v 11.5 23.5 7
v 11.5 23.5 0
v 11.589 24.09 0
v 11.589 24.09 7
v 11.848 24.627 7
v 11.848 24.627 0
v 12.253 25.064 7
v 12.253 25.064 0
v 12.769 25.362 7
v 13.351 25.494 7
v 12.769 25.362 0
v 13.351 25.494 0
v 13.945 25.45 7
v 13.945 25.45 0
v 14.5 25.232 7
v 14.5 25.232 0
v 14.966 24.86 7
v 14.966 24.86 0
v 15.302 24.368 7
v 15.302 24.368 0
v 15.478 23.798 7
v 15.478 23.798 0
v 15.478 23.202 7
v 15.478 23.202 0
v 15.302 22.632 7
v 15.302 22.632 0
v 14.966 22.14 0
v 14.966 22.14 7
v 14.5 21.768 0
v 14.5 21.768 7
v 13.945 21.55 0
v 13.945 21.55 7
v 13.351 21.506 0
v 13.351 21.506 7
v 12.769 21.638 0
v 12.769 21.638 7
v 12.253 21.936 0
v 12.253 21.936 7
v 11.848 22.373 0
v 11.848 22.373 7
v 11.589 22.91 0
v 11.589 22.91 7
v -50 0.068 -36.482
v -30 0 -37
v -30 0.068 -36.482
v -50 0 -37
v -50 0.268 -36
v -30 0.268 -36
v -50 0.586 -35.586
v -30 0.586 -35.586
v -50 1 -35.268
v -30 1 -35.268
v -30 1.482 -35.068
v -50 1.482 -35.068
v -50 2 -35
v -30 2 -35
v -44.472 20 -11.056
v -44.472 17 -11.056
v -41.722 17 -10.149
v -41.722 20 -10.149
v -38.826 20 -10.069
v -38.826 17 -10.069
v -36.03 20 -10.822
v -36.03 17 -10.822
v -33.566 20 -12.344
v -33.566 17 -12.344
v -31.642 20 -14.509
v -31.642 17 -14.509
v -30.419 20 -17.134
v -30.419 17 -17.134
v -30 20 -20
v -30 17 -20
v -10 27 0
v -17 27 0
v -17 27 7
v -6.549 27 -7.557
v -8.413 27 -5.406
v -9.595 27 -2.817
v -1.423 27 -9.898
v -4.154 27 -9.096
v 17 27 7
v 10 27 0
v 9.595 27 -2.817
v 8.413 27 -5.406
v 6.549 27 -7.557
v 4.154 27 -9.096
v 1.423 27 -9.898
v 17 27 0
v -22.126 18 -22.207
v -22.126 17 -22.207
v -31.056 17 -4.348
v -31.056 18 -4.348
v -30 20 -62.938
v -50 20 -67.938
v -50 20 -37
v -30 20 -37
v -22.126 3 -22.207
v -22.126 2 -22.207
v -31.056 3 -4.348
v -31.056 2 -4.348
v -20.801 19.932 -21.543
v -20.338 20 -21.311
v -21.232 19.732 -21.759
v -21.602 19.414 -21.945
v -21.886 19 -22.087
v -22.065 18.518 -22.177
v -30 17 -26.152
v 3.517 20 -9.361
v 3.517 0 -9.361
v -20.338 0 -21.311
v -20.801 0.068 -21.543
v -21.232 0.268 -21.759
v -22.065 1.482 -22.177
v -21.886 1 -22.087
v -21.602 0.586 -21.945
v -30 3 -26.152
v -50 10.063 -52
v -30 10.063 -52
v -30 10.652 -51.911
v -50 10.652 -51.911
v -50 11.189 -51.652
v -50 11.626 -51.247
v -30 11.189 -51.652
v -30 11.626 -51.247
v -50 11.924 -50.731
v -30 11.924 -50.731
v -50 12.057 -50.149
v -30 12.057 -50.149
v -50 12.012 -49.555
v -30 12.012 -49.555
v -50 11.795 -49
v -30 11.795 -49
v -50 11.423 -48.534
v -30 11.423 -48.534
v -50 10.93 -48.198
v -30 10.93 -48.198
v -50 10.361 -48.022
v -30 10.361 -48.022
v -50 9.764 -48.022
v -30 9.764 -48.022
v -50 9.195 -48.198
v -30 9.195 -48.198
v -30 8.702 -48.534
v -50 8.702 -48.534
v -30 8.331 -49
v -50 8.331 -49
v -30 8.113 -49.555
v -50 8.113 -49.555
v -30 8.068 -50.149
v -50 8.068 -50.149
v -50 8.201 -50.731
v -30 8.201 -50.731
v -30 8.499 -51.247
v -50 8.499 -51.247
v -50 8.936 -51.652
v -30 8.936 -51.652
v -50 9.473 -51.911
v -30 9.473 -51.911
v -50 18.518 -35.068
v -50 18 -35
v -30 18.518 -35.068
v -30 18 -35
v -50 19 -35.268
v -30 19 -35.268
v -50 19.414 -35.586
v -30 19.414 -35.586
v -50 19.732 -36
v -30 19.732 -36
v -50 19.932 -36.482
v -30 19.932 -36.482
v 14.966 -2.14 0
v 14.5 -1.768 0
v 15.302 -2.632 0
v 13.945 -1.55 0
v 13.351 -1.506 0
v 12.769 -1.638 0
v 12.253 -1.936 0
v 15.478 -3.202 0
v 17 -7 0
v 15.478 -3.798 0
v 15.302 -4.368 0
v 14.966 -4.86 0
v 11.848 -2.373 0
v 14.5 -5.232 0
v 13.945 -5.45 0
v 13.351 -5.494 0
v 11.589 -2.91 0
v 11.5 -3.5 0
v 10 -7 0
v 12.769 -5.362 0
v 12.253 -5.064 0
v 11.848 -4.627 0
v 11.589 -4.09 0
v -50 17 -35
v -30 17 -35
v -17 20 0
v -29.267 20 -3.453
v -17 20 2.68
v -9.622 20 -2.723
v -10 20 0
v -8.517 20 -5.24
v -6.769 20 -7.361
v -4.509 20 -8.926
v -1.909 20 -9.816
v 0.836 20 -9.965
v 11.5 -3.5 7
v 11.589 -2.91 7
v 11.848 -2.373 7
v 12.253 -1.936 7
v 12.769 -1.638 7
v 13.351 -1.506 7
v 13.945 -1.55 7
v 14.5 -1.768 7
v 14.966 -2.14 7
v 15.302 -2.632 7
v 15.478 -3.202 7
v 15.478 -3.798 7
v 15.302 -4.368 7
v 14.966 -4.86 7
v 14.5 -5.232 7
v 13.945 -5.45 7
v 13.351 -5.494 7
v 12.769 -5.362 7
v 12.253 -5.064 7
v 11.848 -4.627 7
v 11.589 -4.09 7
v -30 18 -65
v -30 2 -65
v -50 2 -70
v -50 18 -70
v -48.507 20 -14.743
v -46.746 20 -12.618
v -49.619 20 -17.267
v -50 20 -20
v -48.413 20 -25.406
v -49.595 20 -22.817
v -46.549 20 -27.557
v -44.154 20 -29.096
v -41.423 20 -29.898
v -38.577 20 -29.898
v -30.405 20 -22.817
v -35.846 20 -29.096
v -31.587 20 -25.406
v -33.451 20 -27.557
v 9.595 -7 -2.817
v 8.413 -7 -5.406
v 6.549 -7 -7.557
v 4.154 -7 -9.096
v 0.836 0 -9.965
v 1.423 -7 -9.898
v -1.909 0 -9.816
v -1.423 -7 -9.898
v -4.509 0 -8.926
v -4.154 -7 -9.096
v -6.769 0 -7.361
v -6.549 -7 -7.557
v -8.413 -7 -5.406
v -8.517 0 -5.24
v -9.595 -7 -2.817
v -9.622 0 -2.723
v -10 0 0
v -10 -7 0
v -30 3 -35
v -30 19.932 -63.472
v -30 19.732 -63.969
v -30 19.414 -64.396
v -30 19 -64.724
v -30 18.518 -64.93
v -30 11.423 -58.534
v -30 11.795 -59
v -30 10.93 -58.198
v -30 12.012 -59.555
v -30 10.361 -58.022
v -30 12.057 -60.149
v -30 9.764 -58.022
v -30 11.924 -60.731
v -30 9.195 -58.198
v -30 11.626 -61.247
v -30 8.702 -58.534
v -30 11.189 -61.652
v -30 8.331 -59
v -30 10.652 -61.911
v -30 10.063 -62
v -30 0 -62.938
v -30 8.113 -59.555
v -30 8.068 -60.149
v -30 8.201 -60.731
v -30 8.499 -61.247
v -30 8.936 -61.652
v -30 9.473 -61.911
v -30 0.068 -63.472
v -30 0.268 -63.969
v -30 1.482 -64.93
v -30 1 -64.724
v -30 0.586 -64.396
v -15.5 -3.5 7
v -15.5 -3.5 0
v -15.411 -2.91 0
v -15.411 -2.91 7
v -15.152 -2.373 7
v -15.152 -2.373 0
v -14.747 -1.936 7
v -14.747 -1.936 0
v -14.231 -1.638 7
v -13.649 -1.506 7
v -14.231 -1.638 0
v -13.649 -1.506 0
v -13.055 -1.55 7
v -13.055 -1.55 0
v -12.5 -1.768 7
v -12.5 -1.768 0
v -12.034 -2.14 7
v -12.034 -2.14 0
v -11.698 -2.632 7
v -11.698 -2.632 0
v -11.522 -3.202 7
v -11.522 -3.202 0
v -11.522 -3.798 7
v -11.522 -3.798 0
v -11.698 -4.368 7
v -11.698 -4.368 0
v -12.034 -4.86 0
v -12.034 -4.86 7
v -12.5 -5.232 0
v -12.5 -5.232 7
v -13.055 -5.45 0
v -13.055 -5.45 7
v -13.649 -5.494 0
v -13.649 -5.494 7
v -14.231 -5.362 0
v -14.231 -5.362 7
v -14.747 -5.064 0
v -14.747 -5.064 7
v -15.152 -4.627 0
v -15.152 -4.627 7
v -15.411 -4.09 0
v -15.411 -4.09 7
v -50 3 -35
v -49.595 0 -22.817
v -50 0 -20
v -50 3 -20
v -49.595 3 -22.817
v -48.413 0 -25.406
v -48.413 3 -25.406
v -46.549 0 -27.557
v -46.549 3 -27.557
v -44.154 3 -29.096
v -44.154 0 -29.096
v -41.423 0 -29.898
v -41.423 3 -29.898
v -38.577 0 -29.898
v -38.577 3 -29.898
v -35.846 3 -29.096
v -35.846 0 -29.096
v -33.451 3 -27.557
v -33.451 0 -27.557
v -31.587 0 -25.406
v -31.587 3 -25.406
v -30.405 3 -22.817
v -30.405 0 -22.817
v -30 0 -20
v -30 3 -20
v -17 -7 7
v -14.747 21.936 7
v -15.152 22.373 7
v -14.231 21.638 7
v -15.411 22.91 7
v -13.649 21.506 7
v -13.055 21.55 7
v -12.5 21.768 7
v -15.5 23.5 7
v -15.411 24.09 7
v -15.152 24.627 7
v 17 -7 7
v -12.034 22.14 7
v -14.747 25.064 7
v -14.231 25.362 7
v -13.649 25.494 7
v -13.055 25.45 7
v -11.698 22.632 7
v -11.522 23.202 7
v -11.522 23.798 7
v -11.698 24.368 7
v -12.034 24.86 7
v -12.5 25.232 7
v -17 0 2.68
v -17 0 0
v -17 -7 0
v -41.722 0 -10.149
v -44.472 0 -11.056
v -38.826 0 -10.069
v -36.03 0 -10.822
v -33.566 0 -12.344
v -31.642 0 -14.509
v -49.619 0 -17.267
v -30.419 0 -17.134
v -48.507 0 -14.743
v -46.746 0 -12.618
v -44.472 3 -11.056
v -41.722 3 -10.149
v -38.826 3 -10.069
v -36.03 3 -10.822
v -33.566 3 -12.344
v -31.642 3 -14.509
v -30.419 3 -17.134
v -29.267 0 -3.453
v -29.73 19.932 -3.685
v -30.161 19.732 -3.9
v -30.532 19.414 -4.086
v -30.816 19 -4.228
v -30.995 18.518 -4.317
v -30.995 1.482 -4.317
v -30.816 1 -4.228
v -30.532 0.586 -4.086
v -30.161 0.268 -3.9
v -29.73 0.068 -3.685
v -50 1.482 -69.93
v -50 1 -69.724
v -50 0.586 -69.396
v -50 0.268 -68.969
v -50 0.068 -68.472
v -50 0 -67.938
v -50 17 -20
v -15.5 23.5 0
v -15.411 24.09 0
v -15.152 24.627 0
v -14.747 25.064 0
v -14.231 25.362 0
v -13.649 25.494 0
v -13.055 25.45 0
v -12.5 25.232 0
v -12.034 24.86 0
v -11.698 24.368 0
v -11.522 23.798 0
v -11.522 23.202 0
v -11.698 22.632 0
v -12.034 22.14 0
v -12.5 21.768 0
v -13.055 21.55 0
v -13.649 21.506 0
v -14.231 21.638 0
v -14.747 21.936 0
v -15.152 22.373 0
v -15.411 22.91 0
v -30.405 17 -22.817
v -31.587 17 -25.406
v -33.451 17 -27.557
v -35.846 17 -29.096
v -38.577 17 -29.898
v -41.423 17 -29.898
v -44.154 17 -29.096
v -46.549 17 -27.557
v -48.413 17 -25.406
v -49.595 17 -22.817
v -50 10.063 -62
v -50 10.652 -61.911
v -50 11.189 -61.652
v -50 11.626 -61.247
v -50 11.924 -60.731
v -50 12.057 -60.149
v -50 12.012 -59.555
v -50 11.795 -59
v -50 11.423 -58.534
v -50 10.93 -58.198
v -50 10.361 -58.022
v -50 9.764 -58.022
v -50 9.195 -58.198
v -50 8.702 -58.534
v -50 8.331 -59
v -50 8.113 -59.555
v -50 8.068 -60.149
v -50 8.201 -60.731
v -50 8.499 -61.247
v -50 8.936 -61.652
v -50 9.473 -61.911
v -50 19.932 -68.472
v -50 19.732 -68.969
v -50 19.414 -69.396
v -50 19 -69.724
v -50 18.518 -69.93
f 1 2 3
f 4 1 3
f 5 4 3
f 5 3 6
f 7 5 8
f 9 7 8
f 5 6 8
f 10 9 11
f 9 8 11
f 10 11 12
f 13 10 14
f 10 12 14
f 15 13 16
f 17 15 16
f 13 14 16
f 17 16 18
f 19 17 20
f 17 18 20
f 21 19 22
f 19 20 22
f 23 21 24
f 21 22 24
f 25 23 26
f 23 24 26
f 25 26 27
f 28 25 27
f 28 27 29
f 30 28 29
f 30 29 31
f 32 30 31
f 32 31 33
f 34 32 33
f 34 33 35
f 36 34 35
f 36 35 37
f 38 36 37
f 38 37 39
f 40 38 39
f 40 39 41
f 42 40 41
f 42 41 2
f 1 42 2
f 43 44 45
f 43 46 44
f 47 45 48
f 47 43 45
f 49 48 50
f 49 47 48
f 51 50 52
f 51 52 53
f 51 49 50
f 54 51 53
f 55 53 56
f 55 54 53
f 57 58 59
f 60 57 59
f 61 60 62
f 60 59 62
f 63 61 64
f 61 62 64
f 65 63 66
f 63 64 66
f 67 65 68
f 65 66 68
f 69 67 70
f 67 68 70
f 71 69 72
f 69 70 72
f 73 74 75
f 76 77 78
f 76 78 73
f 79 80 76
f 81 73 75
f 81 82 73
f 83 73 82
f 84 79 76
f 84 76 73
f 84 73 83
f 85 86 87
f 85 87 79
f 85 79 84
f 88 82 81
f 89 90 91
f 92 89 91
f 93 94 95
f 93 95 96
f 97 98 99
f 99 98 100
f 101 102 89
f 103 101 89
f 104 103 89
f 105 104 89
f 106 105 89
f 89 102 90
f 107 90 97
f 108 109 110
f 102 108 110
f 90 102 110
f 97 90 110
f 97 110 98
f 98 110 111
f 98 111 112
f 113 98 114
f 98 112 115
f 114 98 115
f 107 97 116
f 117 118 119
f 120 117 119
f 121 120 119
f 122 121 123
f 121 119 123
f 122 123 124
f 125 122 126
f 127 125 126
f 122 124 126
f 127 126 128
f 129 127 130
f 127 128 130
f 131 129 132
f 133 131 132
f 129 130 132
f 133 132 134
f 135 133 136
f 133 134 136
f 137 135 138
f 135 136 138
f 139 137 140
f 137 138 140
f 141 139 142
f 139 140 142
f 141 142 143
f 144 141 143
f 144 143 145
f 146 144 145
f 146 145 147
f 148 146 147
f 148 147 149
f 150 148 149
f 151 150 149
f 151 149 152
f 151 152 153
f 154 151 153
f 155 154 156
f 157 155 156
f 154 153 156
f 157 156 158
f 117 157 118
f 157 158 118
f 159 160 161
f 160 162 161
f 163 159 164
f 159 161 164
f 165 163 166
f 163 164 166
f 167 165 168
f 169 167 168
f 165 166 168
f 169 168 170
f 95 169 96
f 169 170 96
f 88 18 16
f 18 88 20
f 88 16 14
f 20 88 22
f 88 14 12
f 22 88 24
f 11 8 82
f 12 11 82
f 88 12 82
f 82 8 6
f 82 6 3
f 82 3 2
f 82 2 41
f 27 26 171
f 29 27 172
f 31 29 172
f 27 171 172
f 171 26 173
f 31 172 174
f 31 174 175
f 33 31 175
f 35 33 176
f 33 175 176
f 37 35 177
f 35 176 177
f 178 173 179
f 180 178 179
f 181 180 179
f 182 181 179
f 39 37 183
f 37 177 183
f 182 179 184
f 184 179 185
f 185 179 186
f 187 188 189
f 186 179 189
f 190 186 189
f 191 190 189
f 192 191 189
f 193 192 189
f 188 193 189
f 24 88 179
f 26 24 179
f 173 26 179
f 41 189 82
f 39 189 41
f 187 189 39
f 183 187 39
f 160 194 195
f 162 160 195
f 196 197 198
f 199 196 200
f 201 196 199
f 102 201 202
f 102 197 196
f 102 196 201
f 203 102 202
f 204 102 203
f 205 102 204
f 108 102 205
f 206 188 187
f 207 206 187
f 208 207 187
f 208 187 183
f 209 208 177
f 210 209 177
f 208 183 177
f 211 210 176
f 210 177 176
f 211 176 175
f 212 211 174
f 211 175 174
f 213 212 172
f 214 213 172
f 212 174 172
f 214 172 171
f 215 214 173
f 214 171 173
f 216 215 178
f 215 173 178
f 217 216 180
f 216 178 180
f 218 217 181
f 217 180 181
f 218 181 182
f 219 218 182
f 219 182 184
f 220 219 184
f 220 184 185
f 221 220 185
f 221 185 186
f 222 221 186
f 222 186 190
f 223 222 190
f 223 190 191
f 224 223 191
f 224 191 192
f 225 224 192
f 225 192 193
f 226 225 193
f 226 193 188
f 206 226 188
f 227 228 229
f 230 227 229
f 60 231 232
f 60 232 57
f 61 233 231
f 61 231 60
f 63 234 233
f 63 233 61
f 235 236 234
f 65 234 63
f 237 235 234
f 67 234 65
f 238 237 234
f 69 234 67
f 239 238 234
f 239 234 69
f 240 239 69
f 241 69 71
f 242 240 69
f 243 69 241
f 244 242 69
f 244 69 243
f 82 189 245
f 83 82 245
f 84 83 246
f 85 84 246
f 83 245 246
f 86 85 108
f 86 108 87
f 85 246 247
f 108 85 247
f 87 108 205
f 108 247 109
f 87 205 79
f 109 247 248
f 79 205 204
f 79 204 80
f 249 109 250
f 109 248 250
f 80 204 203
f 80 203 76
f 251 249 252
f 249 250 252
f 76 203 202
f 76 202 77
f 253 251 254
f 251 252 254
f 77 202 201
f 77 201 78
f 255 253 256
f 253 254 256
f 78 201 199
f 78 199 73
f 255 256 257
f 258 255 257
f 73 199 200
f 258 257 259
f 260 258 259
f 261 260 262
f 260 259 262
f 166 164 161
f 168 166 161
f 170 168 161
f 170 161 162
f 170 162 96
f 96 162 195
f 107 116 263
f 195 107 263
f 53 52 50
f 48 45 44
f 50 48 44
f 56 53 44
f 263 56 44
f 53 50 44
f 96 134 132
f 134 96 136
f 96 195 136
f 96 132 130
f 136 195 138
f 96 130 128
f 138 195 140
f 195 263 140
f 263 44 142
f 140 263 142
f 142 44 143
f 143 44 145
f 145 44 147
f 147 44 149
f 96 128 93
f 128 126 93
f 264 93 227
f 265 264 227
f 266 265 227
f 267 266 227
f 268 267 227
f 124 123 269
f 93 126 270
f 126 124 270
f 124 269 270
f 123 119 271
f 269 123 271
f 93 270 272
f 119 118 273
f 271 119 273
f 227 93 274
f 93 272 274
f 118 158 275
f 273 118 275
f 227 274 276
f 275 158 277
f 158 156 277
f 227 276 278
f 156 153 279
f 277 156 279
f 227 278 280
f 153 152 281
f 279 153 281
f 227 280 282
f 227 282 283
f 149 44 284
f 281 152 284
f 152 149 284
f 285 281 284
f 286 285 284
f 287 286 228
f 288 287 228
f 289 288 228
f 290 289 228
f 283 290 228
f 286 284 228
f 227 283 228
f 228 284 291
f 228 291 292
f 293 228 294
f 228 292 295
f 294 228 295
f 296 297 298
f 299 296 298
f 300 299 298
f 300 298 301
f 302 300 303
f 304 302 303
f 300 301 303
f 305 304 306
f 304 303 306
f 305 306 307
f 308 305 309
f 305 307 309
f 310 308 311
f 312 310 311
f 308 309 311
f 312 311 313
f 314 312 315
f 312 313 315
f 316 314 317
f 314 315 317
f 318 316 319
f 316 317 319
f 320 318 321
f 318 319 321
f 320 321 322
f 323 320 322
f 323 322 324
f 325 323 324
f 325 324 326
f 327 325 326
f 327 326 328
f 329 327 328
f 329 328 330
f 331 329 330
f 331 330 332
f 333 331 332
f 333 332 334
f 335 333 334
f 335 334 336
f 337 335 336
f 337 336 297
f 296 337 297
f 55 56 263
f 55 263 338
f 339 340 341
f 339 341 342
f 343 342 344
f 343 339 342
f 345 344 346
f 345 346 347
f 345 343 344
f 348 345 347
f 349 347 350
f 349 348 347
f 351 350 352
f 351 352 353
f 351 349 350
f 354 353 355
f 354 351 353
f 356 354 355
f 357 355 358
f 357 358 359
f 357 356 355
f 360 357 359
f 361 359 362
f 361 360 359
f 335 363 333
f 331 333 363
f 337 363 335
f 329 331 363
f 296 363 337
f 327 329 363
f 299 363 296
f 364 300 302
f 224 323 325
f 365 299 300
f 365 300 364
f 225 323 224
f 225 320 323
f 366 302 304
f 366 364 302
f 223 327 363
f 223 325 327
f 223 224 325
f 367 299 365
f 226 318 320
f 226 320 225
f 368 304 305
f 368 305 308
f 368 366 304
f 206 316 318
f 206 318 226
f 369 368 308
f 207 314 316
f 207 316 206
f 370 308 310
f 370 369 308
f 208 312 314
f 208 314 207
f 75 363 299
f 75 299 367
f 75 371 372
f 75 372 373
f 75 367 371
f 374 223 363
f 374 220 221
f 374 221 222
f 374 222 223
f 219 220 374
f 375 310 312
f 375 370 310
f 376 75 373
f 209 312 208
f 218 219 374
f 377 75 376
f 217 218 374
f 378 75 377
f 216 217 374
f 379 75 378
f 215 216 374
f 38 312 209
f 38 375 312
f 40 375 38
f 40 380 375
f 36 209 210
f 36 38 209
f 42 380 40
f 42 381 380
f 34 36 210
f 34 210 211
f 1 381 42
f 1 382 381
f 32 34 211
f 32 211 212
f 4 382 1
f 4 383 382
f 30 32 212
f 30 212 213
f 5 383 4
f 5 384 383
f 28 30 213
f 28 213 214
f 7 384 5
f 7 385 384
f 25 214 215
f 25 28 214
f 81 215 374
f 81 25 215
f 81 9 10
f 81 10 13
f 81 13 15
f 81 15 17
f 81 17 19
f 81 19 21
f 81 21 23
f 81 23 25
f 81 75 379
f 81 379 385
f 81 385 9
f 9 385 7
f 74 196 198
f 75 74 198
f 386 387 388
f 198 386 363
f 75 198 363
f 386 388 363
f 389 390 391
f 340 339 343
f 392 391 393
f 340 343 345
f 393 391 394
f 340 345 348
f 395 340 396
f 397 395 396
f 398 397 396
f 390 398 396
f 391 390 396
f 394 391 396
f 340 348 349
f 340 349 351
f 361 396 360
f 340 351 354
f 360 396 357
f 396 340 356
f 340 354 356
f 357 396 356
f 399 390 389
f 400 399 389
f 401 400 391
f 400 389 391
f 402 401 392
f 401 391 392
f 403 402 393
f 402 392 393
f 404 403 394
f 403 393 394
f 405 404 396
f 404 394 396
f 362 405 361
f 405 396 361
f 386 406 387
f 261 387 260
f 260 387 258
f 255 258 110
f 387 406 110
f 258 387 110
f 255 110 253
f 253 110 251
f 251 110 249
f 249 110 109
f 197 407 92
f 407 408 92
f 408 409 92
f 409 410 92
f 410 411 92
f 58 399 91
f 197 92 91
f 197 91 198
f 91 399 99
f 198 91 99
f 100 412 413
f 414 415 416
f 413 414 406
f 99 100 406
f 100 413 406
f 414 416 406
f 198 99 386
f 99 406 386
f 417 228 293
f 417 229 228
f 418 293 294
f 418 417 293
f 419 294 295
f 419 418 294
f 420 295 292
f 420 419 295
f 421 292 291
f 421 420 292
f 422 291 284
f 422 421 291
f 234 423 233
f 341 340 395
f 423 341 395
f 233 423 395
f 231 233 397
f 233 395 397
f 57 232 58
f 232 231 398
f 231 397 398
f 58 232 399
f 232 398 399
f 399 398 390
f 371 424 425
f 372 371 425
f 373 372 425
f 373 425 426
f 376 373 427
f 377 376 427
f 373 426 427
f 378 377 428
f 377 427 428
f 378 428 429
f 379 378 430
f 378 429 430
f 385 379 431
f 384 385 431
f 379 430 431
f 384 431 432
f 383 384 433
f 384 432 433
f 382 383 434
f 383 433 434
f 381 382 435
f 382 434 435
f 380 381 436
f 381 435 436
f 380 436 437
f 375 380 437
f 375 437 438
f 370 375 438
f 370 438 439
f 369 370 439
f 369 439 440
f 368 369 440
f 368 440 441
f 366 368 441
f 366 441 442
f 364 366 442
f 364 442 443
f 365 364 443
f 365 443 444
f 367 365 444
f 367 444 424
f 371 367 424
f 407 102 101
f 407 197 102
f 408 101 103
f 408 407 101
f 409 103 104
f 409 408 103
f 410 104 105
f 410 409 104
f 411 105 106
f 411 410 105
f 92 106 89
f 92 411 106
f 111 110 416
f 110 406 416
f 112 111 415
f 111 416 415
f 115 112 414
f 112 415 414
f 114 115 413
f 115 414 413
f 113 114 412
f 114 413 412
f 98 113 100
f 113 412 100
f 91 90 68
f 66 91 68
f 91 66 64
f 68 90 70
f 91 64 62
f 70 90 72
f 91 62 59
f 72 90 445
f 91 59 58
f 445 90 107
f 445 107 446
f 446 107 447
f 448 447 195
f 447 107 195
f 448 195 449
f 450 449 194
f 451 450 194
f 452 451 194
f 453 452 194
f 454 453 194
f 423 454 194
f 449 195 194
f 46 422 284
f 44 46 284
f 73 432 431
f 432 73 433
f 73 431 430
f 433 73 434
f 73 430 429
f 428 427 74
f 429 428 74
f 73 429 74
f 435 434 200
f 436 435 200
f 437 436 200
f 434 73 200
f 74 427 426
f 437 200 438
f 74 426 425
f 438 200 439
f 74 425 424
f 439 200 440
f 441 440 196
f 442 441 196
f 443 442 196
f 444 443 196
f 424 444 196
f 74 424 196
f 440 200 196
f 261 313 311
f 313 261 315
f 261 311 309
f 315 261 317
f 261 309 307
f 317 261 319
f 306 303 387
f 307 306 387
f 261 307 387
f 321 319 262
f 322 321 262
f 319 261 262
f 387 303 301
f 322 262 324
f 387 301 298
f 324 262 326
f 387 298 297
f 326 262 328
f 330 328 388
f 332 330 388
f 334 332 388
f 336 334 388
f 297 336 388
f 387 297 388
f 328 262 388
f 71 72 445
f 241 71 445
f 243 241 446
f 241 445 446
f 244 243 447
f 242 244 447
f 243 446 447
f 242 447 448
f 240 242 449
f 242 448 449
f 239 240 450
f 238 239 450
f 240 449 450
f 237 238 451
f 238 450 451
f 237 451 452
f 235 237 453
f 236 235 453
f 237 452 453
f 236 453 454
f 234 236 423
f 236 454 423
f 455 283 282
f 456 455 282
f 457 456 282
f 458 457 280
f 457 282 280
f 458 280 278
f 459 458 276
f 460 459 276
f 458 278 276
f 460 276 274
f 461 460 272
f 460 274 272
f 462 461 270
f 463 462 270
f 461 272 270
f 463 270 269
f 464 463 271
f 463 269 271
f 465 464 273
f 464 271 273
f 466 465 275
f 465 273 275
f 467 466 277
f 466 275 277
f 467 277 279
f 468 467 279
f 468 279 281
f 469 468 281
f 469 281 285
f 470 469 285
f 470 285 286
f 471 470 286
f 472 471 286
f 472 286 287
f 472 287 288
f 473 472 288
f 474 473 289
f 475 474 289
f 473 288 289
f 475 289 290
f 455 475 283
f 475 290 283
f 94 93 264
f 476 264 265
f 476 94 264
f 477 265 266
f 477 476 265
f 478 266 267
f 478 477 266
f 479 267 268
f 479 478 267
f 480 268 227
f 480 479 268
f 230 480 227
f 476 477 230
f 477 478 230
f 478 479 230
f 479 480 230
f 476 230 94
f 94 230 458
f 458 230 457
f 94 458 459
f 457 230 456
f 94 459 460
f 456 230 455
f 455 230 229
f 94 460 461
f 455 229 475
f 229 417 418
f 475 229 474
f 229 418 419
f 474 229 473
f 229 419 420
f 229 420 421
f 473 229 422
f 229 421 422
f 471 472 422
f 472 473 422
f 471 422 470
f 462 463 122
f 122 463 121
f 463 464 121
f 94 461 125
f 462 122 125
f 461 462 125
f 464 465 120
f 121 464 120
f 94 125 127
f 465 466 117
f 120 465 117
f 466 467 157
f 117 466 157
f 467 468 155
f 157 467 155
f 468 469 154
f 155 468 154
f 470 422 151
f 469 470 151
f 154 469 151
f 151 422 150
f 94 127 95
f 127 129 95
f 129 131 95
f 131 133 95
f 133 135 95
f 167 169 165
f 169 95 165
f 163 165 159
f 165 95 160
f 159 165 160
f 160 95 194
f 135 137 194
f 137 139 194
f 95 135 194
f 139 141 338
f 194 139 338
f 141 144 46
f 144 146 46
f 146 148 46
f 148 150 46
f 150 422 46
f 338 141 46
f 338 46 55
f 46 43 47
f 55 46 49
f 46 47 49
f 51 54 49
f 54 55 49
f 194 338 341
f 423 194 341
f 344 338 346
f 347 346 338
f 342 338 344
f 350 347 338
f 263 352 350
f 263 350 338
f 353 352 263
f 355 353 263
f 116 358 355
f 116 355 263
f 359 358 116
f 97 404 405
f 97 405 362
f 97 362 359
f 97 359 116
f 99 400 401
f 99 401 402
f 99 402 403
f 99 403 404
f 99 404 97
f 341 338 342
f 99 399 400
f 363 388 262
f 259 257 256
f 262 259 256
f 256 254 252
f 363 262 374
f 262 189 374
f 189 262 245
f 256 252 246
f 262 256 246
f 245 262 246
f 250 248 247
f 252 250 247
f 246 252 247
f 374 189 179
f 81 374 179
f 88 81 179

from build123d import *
from build123d.topology import SkipClean

# Parameters (mm, degrees)
SALIENTE_EXTRUIR1_DEPTH      = 20
CORTAR_EXTRUIR1_START        = -3
CORTAR_EXTRUIR1_DEPTH        = 3
CORTAR_EXTRUIR2_DEPTH        = 3
SALIENTE_EXTRUIR4_START      = -20
SALIENTE_EXTRUIR4_DEPTH      = 20
CORTAR_EXTRUIR3_START        = -3
CORTAR_EXTRUIR3_DEPTH        = 3
CORTAR_EXTRUIR4_DEPTH        = 3
CROQUIS9_R                   = 2
CORTAR_EXTRUIR5_DEPTH        = 20
SALIENTE_EXTRUIR5_DEPTH      = 7
SALIENTE_EXTRUIR5_DEPTH_BACK = 27
CROQUIS11_R                  = 2
CORTAR_EXTRUIR6_DEPTH        = 10
REDONDEO1_R                  = 2
REDONDEO3_R                  = 2
CROQUIS12_W                  = 34
CROQUIS12_H                  = 34
CORTAR_EXTRUIR7_DEPTH        = 3


with BuildPart() as part:
    # Croquis1 → Saliente-Extruir1 (new body)
    with BuildSketch(Plane(origin=(0, 0, 0), x_dir=(1, 0, 0), z_dir=(0, 1, 0))):
        with BuildLine():
            Line((-44.472135955, 11.05572809), (-4.472135955, -8.94427191))
            ThreePointArc((-4.472135955, -8.94427191), (9.165086698, -4.000148225), (3.517298828, 9.361015381))
            Line((3.517298828, 9.361015381), (-34.952618119, 28.632724723))
            ThreePointArc((-34.952618119, 28.632724723), (-48.793203604, 24.762307253), (-44.472135955, 11.05572809))
        make_face()
    extrude(amount=SALIENTE_EXTRUIR1_DEPTH)

    # Croquis3 → Cortar-Extruir1 (cut)
    with BuildSketch(Plane(origin=(0, 20, 0), x_dir=(1, 0, 0), z_dir=(0, 1, 0)).offset(CORTAR_EXTRUIR1_START)):
        with BuildLine():
            Line((-34.952618119, 28.632724723), (-22.125927279, 22.20712578))
            Line((-22.125927279, 22.20712578), (-31.05572809, 4.347524158))
            Line((-31.05572809, 4.347524158), (-44.472135955, 11.05572809))
            ThreePointArc((-44.472135955, 11.05572809), (-31.206796396, 15.237692747), (-34.952618119, 28.632724723))
        make_face()
    extrude(amount=CORTAR_EXTRUIR1_DEPTH, mode=Mode.SUBTRACT)

    # Croquis5 → Cortar-Extruir2 (cut)
    with BuildSketch(Plane.XZ):
        with BuildLine():
            Line((-35.508565818, -28.934596744), (-22.125927279, -22.20712578))
            Line((-22.125927279, -22.20712578), (-31.05572809, -4.347524158))
            Line((-31.05572809, -4.347524158), (-44.472135955, -11.05572809))
            ThreePointArc((-44.472135955, -11.05572809), (-31.060560465, -15.518212321), (-35.508565818, -28.934596744))
        make_face()
    extrude(amount=-CORTAR_EXTRUIR2_DEPTH, mode=Mode.SUBTRACT)

    # Croquis6 → Saliente-Extruir4 (add)
    with BuildSketch(Plane(origin=(0, 20, 0), x_dir=(1, 0, 0), z_dir=(0, 1, 0)).offset(SALIENTE_EXTRUIR4_START)):
        with BuildLine():
            ThreePointArc((-50, 20), (-40, 30), (-30, 20))
            Line((-30, 20), (-30, 65))
            Line((-30, 65), (-50, 70))
            Line((-50, 70), (-50, 20))
        make_face()
    extrude(amount=SALIENTE_EXTRUIR4_DEPTH)

    # Croquis7 → Cortar-Extruir3 (cut)
    with BuildSketch(Plane(origin=(0, 20, 0), x_dir=(1, 0, 0), z_dir=(0, 1, 0)).offset(CORTAR_EXTRUIR3_START)):
        with BuildLine():
            Line((-50, 20), (-50, 35))
            Line((-50, 35), (-30, 35))
            Line((-30, 35), (-30, 20))
            ThreePointArc((-30, 20), (-40, 30), (-50, 20))
        make_face()
    extrude(amount=CORTAR_EXTRUIR3_DEPTH, mode=Mode.SUBTRACT)

    # Croquis8 → Cortar-Extruir4 (cut)
    with SkipClean():  # the faces are left unmerged after this step: merging them gives an invalid solid
        with BuildSketch(Plane.XZ):
            with BuildLine():
                Line((-30, -20), (-30, -35))
                Line((-30, -35), (-50, -35))
                Line((-50, -35), (-50, -20))
                ThreePointArc((-50, -20), (-40, -30), (-30, -20))
            make_face()
        extrude(amount=-CORTAR_EXTRUIR4_DEPTH, mode=Mode.SUBTRACT)

    # Croquis9 → Cortar-Extruir5 (cut)
    with SkipClean():  # the faces are left unmerged after this step: merging them gives an invalid solid
        with BuildSketch(Plane(origin=(-30, 0, 0), x_dir=(0, 0, -1), z_dir=(1, 0, 0))):
            with Locations((60, 10.062568572)):
                Circle(CROQUIS9_R)
            with Locations((50, 10.062568572)):
                Circle(CROQUIS9_R)
        extrude(amount=-CORTAR_EXTRUIR5_DEPTH, mode=Mode.SUBTRACT)

    # Croquis10 → Saliente-Extruir5 (add, two sides: drawn at the far end of the back side and taken through both)
    with SkipClean():  # the faces are left unmerged after this step: merging them gives an invalid solid
        with BuildSketch(Plane(origin=(0, 20, 0), x_dir=(1, 0, 0), z_dir=(0, 1, 0)).offset(-SALIENTE_EXTRUIR5_DEPTH_BACK)):
            with BuildLine():
                Line((0, -10), (17, -10))
                Line((17, -10), (17, 0))
                Line((17, 0), (10, 0))
                ThreePointArc((10, 0), (0, 10), (-10, 0))
                Line((-10, 0), (-17, 0))
                Line((-17, 0), (-17, -1.677390217))
                Line((-17, -1.677390217), (-17, -10))
                Line((-17, -10), (0, -10))
            make_face()
        extrude(amount=SALIENTE_EXTRUIR5_DEPTH + SALIENTE_EXTRUIR5_DEPTH_BACK)

    # Croquis11 → Cortar-Extruir6 (cut)
    with SkipClean():  # the faces are left unmerged after this step: merging them gives an invalid solid
        with BuildSketch(Plane(origin=(0, 0, 0), x_dir=(-1, 0, 0), z_dir=(0, 0, -1))):
            with Locations((13.5, 23.5)):
                Circle(CROQUIS11_R)
            with Locations((-13.5, 23.5)):
                Circle(CROQUIS11_R)
            with Locations((-13.5, -3.5)):
                Circle(CROQUIS11_R)
            with Locations((13.5, -3.5)):
                Circle(CROQUIS11_R)
        extrude(amount=-CORTAR_EXTRUIR6_DEPTH, mode=Mode.SUBTRACT)

    # Redondeo1
    redondeo1_edges = [part.edges().sort_by_distance(p)[0] for p in [
        (-26.590827684, 20, -13.277324969),
        (-26.590827684, 0, -13.277324969),
        (-40, 20, -35),
        (-40, 0, -35),
    ]]
    fillet(redondeo1_edges, radius=REDONDEO1_R)

    # Redondeo3
    redondeo3_edges = [part.edges().sort_by_distance(p)[0] for p in [
        (-40, 0, -67.5),
        (-40, 20, -67.5),
    ]]
    fillet(redondeo3_edges, radius=REDONDEO3_R)

    # Croquis12 → Cortar-Extruir7 (cut)
    with SkipClean():  # the faces are left unmerged after this step: merging them gives an invalid solid
        with BuildSketch(Plane.XY.offset(10)):
            with Locations((0, 10)):
                Rectangle(CROQUIS12_W, CROQUIS12_H)
        extrude(amount=-CORTAR_EXTRUIR7_DEPTH, mode=Mode.SUBTRACT)


solid = part.part
